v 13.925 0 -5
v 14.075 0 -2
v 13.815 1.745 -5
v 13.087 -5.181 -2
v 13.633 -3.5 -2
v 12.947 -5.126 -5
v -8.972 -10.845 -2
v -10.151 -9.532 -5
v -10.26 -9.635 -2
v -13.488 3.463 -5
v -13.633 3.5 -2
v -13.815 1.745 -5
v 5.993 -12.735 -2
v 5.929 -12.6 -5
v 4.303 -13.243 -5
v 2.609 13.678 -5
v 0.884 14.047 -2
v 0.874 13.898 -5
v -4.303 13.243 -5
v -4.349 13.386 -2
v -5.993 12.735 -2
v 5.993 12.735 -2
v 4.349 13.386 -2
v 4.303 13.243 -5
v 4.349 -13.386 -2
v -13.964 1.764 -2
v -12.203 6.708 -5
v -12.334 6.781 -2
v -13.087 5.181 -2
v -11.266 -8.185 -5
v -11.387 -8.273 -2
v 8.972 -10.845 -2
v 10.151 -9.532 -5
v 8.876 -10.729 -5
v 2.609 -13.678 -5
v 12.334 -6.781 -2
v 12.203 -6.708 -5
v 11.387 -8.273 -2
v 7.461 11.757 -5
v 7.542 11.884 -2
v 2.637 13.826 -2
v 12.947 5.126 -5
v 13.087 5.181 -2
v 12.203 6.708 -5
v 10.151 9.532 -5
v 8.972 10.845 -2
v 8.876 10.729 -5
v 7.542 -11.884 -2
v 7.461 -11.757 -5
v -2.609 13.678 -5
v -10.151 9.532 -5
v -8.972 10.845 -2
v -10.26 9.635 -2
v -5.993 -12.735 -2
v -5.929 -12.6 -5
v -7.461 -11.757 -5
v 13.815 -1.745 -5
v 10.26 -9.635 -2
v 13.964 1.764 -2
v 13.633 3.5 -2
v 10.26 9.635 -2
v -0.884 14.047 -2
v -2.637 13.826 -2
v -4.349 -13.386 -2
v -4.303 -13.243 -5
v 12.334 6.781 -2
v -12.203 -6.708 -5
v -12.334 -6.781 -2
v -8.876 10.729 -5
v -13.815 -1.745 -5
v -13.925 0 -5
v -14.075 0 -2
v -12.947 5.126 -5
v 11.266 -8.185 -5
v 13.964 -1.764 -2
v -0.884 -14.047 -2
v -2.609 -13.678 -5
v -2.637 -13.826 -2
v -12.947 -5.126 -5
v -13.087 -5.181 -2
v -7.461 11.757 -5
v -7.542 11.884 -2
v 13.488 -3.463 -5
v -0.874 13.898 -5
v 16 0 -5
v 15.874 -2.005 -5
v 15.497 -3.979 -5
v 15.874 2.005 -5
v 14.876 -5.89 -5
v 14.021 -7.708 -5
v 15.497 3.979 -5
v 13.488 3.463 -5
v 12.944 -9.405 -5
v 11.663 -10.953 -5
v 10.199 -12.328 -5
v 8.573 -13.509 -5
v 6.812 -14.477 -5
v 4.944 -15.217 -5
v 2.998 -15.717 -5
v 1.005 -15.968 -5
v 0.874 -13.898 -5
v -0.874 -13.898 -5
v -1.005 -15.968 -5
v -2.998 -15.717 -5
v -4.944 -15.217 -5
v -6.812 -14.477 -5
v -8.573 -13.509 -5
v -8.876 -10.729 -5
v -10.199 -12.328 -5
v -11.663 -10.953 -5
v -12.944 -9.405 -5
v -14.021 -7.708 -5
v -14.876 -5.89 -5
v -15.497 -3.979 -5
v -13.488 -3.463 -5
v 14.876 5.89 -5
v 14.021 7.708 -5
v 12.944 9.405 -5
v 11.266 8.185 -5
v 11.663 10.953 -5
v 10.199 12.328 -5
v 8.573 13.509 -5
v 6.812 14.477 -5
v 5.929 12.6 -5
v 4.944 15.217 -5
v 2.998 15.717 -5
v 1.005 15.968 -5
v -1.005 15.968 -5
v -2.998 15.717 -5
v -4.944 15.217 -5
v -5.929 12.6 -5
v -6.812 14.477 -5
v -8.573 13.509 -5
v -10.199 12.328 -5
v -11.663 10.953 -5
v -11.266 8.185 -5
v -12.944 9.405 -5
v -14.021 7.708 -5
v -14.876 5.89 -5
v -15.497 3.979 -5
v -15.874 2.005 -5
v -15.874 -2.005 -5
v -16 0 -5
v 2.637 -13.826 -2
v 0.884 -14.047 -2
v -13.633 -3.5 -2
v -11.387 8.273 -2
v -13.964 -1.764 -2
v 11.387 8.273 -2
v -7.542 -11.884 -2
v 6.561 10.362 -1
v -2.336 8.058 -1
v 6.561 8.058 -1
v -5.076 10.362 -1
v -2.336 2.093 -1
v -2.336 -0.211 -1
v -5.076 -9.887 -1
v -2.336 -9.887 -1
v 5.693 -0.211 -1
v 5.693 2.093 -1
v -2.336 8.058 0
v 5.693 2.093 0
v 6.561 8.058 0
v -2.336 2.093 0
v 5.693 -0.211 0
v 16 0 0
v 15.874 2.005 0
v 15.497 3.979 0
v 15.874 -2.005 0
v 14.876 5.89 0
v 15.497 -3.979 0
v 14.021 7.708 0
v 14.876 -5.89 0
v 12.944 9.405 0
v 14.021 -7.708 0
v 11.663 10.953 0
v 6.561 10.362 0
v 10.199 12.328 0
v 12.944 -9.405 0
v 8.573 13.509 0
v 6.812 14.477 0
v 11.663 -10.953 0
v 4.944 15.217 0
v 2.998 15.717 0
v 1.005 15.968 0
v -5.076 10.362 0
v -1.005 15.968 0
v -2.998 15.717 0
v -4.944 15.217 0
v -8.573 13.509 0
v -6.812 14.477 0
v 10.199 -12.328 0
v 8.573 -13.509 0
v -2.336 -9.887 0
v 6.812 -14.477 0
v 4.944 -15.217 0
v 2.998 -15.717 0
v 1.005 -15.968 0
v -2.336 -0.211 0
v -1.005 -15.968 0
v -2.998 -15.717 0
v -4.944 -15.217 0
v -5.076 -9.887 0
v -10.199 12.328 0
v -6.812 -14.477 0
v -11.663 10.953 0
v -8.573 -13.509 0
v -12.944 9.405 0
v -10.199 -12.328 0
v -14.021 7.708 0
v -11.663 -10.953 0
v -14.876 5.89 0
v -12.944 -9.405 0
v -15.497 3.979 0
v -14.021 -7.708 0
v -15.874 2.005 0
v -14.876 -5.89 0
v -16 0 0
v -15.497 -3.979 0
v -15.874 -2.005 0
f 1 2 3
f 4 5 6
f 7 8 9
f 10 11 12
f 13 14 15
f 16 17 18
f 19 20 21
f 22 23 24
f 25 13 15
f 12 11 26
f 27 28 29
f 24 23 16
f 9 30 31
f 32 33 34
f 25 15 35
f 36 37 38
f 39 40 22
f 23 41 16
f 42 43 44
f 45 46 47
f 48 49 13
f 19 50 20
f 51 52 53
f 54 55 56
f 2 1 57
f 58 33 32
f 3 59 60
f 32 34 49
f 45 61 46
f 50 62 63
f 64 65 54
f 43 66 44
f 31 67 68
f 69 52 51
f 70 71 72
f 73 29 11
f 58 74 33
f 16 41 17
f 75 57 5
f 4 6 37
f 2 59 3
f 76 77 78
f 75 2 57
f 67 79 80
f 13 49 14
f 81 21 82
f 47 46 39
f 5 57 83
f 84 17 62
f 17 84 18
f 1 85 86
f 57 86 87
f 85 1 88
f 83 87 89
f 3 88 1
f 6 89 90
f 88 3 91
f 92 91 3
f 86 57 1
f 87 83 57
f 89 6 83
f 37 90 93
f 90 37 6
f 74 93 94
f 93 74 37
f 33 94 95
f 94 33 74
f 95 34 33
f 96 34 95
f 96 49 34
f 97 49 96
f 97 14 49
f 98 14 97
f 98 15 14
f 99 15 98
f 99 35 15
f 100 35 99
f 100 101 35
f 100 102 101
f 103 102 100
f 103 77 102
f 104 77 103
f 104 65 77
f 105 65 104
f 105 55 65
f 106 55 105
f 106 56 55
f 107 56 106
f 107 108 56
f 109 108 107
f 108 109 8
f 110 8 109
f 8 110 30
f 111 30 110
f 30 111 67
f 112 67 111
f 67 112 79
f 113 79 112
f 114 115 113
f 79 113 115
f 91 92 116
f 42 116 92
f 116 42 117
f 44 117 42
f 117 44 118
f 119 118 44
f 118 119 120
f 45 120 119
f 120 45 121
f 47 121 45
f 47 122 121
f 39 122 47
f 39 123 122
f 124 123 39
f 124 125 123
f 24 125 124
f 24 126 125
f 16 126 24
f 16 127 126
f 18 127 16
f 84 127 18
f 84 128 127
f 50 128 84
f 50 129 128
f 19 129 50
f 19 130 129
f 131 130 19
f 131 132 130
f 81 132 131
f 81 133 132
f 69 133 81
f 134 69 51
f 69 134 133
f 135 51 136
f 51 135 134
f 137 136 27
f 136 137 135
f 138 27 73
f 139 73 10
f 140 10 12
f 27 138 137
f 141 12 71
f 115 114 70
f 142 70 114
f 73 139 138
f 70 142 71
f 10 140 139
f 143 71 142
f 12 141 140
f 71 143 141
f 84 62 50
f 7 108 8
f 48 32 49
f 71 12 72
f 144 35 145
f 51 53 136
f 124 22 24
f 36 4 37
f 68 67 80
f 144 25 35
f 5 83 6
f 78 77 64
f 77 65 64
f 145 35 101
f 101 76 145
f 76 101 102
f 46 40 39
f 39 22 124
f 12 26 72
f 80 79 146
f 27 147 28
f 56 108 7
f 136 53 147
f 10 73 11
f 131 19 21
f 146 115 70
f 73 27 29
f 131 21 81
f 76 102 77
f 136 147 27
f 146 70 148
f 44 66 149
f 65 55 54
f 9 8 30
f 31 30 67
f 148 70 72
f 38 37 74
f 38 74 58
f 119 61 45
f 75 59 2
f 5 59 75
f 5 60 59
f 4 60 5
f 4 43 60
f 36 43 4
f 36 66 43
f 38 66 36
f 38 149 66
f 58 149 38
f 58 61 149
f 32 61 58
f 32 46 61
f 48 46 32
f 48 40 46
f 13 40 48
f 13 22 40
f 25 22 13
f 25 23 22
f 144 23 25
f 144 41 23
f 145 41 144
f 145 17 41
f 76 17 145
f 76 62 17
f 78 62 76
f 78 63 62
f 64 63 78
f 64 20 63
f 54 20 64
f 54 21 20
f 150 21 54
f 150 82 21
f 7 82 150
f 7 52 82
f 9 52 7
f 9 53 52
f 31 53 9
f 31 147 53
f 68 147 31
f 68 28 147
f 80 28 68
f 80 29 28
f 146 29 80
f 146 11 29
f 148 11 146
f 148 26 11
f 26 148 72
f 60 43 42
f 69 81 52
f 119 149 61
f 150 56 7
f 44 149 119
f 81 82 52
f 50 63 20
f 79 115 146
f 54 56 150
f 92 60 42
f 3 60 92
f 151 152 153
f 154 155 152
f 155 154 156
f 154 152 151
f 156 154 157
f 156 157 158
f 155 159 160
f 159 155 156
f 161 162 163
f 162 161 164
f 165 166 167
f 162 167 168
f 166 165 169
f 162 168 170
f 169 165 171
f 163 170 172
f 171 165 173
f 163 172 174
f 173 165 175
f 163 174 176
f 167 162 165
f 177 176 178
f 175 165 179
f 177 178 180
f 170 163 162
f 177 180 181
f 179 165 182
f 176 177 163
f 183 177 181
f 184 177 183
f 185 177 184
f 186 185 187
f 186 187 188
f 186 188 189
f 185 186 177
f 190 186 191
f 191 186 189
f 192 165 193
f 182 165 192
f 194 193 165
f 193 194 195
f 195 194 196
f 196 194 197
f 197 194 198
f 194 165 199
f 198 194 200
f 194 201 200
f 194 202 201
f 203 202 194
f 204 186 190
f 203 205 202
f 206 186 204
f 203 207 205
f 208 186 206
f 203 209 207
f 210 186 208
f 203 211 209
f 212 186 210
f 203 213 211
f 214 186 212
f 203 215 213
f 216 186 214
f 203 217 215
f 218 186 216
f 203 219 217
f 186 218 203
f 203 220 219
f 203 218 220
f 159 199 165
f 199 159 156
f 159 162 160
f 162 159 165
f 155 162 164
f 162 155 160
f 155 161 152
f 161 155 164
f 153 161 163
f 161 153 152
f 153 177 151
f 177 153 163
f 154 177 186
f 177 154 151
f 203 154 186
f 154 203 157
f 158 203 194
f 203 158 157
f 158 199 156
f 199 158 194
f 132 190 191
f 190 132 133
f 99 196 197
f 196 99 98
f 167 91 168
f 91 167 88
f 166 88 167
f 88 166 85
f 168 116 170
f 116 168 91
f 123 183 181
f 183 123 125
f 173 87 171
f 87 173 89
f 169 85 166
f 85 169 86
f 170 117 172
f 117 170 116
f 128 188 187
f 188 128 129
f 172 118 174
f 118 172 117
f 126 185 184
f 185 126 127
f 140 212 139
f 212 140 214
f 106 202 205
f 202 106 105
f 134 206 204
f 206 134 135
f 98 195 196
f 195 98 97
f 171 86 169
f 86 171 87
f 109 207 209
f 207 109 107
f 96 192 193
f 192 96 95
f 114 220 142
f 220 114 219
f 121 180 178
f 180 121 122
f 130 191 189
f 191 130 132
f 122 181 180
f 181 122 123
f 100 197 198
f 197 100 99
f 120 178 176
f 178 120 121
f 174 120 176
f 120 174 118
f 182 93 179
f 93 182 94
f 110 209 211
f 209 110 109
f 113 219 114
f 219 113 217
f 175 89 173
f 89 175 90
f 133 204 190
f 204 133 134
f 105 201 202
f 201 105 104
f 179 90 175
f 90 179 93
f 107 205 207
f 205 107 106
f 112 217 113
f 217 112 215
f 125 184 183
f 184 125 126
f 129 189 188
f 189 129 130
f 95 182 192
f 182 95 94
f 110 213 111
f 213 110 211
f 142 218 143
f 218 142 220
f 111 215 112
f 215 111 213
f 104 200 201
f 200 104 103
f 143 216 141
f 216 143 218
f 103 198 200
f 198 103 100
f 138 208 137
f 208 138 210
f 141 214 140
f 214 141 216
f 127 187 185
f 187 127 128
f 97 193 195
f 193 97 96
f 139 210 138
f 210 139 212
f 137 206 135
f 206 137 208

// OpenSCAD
$fn = 50;


difference() {
	union() {
		translate(v = [0, 0, -5.0000000000]) {
			cylinder(h = 5, r = 16.0000000000);
		}
	}
	union() {
		#translate(v = [0, 0, -5.0000000000]) {
			cylinder(h = 3, r1 = 13.9250000000, r2 = 14.0750000000);
		}
		translate(v = [0, 0, -1]) {
			linear_extrude(height = 1) {
				text(font = "Impact", halign = "center", size = 20, text = "F", valign = "center");
			}
		}
	}
}
